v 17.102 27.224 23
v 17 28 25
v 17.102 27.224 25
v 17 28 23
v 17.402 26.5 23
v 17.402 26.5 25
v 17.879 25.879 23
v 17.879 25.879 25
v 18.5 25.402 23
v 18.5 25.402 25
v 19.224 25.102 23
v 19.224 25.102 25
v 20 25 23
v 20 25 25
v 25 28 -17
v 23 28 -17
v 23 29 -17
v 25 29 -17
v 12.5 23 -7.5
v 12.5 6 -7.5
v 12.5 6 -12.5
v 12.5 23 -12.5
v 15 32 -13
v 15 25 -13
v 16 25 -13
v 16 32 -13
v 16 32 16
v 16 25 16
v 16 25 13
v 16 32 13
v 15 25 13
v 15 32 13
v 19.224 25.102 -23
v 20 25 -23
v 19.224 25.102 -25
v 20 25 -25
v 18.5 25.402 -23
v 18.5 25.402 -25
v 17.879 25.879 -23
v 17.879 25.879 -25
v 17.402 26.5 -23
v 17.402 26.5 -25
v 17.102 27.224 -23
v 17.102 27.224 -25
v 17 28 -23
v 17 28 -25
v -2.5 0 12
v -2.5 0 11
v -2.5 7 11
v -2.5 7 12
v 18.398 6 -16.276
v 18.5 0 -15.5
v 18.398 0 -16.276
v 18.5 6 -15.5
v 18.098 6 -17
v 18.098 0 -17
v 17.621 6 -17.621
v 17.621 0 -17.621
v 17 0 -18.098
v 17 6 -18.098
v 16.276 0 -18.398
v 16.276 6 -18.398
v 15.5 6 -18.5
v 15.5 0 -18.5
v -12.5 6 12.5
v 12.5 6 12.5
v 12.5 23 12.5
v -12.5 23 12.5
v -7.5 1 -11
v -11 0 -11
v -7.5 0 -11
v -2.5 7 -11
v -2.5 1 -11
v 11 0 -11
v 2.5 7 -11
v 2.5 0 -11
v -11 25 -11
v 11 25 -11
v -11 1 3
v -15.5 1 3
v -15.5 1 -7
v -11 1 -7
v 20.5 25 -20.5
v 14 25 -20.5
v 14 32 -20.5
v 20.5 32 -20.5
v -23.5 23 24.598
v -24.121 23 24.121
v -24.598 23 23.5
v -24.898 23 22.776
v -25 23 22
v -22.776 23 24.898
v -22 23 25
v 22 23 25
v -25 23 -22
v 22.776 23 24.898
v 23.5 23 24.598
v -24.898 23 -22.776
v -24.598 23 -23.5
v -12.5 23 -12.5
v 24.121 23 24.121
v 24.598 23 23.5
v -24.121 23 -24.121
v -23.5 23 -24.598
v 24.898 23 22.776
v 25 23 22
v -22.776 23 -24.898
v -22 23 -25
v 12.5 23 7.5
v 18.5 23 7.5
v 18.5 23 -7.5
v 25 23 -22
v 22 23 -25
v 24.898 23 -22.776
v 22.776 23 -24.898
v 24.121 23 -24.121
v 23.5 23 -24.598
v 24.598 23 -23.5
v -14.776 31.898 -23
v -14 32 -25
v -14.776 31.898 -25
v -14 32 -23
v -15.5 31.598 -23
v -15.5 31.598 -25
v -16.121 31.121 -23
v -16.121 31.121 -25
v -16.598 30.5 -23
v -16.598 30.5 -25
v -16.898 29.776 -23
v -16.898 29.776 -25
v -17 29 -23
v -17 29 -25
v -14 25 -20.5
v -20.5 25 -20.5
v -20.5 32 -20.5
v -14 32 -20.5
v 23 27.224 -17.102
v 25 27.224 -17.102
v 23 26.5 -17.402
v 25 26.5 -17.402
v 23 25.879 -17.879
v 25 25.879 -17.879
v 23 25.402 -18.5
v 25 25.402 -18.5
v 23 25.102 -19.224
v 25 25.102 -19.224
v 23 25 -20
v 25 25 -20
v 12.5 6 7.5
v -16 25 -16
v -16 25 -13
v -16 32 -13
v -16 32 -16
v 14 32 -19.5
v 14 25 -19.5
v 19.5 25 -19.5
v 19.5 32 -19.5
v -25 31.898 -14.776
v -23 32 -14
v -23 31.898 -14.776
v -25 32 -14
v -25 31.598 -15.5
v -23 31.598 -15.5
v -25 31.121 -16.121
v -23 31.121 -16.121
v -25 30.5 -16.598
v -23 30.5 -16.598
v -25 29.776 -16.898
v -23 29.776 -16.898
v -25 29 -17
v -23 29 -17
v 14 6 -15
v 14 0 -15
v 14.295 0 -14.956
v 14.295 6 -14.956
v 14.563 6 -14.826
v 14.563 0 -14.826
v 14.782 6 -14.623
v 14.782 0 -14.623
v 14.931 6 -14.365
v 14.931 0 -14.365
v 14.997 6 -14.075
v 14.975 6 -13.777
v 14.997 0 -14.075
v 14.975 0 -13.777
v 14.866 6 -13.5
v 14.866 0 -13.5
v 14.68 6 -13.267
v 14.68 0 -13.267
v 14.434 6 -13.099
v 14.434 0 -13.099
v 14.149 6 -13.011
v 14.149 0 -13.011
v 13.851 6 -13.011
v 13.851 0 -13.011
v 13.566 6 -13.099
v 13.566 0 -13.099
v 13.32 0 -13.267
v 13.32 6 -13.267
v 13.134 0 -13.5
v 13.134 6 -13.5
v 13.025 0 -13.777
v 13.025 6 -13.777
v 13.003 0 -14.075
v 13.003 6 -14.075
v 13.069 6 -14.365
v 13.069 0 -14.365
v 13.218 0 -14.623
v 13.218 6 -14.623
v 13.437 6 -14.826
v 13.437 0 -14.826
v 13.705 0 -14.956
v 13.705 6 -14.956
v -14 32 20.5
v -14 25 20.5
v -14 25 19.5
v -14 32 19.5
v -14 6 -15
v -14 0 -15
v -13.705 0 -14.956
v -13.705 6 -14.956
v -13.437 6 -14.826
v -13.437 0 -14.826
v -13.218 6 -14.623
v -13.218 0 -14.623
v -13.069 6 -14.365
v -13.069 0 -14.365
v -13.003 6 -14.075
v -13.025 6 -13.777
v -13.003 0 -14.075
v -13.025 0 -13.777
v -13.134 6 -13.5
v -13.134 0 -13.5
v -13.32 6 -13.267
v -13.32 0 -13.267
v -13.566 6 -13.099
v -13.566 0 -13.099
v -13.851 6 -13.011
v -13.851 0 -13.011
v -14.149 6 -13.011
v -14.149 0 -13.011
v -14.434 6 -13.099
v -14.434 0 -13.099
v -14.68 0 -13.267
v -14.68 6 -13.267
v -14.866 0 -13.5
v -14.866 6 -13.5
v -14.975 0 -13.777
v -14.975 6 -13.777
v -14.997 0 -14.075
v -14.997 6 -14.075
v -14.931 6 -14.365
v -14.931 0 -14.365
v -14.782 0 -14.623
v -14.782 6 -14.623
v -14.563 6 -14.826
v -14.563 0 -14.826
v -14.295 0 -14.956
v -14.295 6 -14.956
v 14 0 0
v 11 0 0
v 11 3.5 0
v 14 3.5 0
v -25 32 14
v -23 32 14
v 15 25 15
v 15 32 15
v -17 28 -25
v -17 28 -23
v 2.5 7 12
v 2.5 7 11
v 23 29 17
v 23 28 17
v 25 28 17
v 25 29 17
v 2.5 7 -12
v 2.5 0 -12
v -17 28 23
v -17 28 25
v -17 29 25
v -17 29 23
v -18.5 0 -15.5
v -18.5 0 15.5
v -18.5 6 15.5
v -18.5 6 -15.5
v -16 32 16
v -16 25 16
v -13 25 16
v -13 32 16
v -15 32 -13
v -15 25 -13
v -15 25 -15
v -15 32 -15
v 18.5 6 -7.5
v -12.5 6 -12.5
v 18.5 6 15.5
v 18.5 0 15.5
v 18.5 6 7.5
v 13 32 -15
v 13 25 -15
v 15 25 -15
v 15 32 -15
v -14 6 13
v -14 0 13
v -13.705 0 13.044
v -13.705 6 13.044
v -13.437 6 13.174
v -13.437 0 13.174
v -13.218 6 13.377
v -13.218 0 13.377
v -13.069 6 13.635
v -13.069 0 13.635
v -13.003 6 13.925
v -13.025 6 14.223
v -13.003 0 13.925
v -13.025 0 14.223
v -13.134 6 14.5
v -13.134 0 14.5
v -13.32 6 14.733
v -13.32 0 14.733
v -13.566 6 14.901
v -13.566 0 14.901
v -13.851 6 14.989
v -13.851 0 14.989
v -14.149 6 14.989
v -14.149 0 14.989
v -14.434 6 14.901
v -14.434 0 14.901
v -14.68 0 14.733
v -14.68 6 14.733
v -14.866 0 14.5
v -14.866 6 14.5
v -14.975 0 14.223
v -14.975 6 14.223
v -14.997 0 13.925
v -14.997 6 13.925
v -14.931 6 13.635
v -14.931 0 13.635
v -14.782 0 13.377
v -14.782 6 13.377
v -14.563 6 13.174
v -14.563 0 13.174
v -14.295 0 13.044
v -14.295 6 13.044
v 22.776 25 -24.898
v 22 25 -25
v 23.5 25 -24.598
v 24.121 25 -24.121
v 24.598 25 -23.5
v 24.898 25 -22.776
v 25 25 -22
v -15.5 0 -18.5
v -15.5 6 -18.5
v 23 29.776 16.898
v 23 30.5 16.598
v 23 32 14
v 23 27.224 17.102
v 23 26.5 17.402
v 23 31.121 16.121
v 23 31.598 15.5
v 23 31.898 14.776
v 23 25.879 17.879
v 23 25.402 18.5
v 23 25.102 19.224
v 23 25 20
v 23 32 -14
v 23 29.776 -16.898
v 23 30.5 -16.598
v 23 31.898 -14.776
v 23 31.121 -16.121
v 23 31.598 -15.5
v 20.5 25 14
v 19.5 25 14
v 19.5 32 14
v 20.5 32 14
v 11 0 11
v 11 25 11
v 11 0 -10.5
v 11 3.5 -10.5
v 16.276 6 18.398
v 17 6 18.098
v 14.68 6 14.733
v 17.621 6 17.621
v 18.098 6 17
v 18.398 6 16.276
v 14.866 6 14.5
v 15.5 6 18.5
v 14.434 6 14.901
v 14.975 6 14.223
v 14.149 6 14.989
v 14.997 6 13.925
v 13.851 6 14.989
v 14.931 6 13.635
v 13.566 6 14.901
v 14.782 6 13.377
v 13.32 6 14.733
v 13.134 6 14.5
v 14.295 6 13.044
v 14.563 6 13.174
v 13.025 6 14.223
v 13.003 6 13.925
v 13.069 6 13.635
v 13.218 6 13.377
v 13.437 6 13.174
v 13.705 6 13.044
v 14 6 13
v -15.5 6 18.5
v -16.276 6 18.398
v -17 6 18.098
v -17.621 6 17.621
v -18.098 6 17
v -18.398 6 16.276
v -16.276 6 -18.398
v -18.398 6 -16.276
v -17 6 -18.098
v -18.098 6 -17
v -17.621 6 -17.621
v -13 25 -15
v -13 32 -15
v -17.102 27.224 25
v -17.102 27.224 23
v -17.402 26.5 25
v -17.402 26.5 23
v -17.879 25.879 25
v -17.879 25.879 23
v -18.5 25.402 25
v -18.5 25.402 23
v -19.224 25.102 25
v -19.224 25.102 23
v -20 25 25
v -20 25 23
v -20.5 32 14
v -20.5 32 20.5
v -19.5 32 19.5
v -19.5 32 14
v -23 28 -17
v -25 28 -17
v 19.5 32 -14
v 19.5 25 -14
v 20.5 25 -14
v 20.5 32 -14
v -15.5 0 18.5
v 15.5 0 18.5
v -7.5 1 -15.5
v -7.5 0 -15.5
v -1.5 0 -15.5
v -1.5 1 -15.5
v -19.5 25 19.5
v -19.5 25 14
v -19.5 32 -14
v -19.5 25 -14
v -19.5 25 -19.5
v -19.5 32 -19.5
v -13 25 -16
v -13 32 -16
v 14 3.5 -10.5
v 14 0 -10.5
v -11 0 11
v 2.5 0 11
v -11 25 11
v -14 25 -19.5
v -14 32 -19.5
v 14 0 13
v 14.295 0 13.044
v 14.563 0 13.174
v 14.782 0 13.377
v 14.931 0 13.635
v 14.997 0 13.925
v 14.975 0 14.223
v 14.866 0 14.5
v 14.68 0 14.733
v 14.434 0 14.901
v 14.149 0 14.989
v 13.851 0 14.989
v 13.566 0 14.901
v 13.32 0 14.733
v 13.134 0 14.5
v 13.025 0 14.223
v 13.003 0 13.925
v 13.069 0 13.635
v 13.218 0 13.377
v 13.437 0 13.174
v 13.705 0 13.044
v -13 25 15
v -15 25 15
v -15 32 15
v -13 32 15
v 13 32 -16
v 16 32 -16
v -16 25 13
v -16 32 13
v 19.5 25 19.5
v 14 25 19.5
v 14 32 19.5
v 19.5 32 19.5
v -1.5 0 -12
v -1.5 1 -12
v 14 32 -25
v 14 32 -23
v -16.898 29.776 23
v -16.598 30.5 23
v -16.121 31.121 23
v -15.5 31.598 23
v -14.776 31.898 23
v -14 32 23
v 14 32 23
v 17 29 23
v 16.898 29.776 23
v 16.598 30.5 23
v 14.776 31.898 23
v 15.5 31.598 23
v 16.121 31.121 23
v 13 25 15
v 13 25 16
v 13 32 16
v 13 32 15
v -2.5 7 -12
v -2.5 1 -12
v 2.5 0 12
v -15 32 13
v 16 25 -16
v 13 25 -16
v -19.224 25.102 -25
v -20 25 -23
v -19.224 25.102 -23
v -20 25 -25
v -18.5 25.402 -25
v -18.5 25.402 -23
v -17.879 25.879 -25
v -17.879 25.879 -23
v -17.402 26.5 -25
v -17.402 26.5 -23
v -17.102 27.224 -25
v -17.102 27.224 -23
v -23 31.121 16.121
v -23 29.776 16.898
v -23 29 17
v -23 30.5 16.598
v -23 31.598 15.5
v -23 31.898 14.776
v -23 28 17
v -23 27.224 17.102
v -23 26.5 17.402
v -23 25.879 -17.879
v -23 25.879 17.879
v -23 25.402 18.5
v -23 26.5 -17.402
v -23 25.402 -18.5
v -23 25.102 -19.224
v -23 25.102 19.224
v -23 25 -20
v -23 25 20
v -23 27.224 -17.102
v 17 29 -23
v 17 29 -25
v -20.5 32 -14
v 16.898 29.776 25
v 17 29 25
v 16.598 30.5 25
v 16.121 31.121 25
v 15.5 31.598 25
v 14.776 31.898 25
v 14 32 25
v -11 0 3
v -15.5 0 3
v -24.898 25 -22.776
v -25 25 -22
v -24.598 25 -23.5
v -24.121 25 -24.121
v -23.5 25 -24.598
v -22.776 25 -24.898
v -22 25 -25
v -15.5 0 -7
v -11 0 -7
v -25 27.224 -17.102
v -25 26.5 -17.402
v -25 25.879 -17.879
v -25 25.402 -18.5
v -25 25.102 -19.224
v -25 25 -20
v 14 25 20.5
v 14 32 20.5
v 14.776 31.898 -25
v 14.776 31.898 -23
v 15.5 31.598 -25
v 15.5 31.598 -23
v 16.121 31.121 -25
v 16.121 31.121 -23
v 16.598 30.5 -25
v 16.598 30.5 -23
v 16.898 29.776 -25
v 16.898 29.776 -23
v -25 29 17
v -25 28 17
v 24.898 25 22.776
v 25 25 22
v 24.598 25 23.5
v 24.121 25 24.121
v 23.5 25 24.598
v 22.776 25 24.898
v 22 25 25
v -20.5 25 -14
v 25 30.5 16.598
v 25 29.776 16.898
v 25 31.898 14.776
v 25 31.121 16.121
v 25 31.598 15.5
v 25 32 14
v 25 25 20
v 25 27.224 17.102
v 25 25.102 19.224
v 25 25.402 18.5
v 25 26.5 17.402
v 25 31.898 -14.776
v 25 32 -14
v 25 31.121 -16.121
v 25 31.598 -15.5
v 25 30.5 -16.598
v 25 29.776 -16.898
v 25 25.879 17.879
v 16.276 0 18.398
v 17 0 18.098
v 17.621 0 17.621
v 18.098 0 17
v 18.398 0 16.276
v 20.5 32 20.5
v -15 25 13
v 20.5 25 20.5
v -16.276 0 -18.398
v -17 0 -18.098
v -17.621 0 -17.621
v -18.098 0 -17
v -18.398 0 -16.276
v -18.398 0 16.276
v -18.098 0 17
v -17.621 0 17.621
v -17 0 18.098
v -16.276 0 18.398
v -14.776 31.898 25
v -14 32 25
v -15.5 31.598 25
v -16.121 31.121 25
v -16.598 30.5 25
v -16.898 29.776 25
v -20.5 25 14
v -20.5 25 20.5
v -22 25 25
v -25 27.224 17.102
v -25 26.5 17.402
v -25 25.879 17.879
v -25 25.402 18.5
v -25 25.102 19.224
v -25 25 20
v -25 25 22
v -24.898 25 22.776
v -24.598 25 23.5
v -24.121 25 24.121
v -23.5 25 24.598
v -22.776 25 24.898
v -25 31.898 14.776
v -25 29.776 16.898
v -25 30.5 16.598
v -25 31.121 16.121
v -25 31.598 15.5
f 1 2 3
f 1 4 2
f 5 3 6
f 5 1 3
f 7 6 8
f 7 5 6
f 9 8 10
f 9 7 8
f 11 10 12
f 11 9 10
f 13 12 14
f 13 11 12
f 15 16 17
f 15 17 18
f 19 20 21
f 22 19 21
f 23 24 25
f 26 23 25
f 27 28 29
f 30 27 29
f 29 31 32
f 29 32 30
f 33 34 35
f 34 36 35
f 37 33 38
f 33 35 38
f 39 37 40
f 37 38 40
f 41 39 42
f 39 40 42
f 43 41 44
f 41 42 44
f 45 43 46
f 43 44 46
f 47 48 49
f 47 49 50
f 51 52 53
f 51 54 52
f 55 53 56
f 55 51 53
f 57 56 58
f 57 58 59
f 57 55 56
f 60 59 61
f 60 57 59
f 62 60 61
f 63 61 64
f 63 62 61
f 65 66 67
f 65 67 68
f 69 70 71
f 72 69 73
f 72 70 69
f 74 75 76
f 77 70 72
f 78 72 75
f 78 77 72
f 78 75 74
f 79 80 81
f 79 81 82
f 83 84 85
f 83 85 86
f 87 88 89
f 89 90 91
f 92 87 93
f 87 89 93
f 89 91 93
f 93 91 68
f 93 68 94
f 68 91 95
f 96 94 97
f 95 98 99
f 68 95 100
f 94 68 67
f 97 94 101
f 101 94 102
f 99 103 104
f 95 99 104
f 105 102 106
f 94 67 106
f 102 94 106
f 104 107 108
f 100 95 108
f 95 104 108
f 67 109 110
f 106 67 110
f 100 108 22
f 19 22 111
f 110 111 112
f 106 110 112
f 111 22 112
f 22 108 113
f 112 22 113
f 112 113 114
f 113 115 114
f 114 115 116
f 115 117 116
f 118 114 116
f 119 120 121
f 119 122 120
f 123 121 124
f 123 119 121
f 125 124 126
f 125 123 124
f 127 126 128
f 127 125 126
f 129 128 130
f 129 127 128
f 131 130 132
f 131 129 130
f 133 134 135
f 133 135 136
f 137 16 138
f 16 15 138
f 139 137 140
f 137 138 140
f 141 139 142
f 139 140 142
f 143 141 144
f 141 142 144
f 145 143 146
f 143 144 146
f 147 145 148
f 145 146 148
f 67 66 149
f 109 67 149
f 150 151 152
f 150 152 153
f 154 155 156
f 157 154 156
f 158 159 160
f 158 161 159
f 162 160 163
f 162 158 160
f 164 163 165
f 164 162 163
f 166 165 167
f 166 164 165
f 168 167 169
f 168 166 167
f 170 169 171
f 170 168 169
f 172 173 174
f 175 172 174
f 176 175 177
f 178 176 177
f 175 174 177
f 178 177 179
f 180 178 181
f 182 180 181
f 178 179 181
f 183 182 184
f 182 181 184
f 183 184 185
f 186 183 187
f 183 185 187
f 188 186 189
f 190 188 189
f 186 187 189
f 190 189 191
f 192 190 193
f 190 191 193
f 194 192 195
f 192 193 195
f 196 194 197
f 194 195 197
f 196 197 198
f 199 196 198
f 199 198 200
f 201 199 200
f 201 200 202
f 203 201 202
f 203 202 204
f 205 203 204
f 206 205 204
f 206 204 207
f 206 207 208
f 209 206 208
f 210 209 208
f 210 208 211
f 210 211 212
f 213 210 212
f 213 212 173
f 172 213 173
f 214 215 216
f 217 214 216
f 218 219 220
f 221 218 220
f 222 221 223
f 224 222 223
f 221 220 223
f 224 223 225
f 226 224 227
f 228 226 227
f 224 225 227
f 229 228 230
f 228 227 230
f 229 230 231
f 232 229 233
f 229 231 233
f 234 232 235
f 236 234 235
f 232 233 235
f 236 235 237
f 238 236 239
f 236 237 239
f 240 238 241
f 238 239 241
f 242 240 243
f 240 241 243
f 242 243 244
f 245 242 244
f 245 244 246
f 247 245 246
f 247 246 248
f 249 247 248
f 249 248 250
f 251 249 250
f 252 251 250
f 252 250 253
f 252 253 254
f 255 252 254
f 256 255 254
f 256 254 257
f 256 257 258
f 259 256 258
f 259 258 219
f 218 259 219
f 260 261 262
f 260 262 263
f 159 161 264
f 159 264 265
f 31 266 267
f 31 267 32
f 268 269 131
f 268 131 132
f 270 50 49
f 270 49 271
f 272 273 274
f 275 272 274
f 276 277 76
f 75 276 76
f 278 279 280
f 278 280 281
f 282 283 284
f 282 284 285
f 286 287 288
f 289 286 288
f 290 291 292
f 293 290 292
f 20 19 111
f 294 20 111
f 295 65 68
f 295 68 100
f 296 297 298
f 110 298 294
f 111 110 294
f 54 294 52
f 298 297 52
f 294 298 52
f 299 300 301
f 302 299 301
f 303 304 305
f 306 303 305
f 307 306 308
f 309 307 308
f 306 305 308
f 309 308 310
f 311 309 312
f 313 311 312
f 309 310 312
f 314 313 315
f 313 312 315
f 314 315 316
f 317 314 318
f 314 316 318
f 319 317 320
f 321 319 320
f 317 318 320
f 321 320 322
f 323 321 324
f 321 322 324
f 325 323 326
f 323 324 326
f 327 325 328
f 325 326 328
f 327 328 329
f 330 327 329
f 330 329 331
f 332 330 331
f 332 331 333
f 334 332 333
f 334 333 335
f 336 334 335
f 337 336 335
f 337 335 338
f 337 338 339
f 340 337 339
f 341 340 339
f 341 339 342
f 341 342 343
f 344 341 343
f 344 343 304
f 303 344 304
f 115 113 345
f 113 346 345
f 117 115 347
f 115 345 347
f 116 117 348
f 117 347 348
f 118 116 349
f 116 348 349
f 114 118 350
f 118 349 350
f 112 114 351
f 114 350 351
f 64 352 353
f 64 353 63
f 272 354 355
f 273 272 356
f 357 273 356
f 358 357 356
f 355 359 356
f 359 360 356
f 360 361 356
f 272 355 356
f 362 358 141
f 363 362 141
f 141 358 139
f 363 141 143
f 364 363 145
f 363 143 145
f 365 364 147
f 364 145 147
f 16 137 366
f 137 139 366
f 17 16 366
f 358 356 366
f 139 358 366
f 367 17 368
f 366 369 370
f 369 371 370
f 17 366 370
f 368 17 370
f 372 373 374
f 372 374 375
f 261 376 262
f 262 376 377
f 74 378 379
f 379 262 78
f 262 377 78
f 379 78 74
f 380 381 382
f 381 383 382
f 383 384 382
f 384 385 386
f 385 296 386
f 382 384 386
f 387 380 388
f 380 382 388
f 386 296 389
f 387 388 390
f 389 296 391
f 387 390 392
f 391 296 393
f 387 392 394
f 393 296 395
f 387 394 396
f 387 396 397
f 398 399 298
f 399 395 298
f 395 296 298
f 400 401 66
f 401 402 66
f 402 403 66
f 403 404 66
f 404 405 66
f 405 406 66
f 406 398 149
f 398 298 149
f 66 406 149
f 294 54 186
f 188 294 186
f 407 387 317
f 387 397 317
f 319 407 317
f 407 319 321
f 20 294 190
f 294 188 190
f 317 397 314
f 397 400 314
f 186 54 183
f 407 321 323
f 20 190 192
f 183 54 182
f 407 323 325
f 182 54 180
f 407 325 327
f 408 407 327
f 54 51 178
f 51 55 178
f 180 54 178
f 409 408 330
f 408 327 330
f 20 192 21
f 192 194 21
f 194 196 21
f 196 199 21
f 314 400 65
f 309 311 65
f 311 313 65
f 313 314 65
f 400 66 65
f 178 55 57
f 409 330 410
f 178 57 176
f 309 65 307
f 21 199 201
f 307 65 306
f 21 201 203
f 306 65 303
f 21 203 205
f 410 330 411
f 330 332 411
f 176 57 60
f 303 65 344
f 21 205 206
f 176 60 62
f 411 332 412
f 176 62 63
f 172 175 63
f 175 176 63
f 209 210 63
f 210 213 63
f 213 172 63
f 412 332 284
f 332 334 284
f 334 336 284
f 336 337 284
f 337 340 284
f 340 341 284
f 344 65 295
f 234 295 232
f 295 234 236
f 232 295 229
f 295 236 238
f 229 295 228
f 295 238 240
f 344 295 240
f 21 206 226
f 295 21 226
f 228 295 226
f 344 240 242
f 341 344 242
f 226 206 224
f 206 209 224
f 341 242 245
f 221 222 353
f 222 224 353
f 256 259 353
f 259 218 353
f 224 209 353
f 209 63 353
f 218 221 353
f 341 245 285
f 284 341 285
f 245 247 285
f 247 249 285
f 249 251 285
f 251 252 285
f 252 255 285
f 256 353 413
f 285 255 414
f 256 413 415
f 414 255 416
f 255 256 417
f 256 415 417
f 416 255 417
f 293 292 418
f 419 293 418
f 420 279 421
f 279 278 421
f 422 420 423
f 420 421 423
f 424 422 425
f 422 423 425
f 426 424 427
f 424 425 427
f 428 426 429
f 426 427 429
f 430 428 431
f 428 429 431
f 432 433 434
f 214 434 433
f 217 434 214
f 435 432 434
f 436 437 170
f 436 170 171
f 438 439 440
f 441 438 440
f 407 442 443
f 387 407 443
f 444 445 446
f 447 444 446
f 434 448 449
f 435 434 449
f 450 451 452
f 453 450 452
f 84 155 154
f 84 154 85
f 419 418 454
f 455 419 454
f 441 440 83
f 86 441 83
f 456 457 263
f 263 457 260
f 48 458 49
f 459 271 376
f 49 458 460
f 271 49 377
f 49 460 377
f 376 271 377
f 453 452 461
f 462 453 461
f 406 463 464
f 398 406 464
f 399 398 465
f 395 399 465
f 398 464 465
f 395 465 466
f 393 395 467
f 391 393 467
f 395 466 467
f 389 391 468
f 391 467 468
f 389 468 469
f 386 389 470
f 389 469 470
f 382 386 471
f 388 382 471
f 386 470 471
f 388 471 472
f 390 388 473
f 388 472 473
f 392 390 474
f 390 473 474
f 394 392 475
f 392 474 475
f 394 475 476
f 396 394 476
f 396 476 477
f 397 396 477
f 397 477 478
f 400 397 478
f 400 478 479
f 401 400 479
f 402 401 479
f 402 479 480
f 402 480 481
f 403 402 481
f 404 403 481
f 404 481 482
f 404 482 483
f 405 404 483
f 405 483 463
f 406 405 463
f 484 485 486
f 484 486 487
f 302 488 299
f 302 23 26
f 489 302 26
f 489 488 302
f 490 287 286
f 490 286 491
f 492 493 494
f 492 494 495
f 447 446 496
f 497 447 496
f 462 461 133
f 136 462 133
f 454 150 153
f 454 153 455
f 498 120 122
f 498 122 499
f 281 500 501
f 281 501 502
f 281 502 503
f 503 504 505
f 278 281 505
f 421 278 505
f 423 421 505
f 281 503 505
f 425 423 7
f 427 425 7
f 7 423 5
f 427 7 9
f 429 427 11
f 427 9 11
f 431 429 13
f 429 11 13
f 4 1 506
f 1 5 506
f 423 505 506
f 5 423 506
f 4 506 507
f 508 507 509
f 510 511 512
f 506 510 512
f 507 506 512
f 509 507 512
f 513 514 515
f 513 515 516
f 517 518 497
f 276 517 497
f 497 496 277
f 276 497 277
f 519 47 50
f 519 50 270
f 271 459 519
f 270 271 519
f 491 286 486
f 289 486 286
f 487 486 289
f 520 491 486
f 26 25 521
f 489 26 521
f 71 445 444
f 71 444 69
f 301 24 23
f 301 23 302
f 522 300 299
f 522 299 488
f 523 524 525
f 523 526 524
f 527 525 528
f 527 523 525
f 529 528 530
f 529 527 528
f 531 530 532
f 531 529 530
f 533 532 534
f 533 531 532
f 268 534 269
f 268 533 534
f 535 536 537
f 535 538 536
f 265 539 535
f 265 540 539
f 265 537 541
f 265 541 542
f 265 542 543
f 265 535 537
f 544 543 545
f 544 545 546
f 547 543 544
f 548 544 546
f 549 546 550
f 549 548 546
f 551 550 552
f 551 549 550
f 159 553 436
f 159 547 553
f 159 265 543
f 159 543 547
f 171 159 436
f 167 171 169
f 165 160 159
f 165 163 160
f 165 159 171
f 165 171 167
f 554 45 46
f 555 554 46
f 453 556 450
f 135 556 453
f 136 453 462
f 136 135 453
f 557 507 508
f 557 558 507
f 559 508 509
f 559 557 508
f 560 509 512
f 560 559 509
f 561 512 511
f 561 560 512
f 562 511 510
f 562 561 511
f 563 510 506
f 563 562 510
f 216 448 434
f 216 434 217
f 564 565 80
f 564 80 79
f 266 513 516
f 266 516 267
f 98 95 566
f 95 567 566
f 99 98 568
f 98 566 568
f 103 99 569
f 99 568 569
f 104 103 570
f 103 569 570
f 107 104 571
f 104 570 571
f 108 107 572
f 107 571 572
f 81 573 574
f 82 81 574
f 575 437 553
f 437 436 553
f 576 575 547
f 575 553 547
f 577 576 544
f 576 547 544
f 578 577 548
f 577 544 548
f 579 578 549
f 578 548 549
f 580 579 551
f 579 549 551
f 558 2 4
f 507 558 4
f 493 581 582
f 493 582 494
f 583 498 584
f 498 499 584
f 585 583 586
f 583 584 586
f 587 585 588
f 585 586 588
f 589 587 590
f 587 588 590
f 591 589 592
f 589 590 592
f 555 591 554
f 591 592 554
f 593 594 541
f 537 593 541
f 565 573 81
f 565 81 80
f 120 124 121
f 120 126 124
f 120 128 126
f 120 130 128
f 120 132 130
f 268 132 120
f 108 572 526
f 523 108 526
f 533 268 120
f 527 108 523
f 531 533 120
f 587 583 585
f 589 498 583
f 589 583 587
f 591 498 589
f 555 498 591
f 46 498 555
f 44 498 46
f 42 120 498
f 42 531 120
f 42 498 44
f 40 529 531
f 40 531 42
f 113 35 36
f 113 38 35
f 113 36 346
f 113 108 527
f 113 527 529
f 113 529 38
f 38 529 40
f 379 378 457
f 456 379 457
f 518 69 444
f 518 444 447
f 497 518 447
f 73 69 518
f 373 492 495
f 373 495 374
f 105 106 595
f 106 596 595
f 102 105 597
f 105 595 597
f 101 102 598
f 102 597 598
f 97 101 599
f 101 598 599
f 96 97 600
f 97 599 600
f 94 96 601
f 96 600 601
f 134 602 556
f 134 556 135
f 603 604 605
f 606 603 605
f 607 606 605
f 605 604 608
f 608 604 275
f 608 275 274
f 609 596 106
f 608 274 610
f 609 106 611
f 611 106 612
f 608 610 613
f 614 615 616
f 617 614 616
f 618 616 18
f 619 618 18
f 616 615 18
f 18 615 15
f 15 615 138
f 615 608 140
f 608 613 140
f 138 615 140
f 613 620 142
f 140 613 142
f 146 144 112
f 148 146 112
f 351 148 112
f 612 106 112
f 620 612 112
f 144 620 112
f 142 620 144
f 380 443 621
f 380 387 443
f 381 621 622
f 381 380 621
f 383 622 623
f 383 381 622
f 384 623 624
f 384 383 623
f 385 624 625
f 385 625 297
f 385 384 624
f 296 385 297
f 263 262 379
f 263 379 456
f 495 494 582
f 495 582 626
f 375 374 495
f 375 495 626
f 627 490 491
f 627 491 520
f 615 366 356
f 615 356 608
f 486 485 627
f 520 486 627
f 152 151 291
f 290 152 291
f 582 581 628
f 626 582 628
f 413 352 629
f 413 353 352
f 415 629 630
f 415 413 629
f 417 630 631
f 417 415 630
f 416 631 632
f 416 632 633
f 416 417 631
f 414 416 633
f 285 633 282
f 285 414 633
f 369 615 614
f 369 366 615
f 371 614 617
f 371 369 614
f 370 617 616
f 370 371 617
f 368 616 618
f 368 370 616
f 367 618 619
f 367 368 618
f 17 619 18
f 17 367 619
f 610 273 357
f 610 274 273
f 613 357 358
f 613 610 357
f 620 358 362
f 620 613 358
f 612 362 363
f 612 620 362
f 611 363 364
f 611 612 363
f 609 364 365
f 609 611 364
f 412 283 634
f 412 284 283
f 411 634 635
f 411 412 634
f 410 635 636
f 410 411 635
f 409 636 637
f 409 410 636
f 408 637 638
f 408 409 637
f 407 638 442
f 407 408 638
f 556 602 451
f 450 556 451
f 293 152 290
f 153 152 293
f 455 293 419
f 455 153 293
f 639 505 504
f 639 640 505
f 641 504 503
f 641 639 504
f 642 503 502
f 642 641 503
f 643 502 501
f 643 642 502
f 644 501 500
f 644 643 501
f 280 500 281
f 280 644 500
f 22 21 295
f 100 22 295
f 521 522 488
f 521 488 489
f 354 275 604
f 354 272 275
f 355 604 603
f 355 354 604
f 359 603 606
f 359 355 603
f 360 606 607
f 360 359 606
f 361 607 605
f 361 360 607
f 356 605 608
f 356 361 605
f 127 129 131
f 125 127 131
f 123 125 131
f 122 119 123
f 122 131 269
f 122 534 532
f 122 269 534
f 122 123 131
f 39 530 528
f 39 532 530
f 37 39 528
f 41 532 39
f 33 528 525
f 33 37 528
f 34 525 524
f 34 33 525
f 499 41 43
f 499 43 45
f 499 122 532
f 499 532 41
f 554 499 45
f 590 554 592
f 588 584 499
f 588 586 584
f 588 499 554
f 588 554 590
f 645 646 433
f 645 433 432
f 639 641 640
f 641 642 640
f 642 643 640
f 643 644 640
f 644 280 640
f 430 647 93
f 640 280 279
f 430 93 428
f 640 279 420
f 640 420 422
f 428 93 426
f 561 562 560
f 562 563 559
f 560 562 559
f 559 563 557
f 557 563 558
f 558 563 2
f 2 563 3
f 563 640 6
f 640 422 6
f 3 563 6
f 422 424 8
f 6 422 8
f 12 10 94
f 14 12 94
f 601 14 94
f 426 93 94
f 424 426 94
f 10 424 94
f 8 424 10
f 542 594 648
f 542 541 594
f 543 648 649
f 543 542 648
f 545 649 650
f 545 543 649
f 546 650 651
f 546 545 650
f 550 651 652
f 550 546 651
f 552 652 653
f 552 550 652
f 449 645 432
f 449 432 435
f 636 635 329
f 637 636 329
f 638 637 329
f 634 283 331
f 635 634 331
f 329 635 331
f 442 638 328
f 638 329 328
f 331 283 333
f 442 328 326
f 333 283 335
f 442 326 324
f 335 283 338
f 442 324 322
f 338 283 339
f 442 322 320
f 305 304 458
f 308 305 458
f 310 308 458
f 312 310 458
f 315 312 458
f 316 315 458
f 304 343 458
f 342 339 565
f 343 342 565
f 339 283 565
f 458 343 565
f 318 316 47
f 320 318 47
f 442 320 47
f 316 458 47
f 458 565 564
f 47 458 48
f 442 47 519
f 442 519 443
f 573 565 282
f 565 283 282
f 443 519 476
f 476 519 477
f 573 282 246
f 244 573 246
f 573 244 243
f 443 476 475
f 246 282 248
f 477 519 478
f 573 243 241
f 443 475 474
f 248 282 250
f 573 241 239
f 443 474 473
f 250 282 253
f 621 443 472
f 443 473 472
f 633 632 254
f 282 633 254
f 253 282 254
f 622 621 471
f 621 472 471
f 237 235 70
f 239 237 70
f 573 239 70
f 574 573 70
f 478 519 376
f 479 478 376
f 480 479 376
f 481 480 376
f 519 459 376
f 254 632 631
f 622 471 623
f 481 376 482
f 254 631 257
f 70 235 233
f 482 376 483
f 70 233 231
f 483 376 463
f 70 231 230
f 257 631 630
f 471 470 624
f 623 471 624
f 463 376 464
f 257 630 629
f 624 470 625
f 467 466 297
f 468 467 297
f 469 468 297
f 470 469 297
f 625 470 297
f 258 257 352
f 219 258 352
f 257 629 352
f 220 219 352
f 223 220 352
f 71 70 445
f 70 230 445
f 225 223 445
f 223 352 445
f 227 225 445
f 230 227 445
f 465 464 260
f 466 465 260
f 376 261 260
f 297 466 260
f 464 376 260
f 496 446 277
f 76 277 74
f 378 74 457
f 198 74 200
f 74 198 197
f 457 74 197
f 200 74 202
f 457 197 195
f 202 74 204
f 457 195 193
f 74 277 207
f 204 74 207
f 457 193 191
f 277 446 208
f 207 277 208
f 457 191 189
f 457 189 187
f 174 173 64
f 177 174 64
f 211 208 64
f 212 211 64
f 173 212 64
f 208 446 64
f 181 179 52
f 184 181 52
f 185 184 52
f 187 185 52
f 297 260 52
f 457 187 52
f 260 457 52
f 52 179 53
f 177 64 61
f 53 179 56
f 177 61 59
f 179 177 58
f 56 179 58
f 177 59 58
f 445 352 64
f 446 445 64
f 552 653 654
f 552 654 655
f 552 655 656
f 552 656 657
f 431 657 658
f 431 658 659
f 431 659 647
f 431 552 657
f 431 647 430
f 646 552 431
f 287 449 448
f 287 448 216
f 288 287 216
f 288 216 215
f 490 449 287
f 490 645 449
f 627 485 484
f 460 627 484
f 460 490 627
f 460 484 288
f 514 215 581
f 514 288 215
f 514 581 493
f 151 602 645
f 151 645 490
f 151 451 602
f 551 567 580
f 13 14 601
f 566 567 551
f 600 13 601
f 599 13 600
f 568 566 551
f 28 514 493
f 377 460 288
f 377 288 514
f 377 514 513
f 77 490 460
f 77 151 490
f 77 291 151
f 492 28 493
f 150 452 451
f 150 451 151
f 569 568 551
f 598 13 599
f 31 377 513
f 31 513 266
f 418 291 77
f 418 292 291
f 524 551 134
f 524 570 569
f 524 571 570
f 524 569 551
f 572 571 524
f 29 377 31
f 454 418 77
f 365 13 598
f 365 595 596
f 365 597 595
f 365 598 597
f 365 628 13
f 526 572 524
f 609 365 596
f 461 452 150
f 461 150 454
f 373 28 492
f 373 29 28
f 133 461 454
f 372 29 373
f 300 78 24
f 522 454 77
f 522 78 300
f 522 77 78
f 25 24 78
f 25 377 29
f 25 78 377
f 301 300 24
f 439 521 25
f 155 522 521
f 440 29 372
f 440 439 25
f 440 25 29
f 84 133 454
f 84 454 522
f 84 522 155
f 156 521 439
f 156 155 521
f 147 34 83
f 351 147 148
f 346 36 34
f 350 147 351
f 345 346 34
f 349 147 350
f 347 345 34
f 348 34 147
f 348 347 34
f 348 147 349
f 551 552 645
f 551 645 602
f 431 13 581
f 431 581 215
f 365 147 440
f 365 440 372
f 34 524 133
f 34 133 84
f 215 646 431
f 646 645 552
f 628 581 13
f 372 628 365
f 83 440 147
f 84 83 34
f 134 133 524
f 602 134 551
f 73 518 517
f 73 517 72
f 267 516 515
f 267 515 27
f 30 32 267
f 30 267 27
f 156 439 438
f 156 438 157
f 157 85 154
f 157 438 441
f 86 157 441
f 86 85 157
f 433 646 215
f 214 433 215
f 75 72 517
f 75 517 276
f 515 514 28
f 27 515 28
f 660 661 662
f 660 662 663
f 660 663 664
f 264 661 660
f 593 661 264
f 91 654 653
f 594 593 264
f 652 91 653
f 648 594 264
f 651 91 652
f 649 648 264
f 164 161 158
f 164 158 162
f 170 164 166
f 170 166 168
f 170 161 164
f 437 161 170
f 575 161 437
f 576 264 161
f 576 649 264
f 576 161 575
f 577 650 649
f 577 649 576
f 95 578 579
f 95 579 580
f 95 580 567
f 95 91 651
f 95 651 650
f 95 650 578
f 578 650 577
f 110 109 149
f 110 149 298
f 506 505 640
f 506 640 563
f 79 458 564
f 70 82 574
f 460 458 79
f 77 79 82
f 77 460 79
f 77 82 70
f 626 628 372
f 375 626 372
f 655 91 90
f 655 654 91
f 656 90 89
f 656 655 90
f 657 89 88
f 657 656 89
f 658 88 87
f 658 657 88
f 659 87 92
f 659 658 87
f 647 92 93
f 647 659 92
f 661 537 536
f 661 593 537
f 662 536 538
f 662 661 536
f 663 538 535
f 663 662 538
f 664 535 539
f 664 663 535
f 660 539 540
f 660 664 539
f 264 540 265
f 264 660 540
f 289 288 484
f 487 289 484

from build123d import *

# Parameters (mm, degrees)
SKETCH_2_W            = 37
SKETCH_2_H            = 37
EXTRUDE_1_DEPTH       = 23
SKETCH_3_W            = 22
SKETCH_3_H            = 22
CUT_EXTRUDE_1_DEPTH   = 23
SKETCH_19_OUTSIDE_W   = 50.432
SKETCH_19_OUTSIDE_H   = 50.432
SKETCH_19_OUTSIDE_W_2 = 25
SKETCH_19_OUTSIDE_H_2 = 25
CUT_EXTRUDE_17_DEPTH  = 17
SKETCH_4_W            = 50
SKETCH_4_H            = 50
EXTRUDE_2_DEPTH       = 9
SKETCH_5_W            = 46
SKETCH_5_H            = 46
CUT_EXTRUDE_3_DEPTH   = 7
SKETCH_12_W           = 8
SKETCH_12_H           = 8
CUT_EXTRUDE_14_DEPTH  = 14
SKETCH_6_W            = 22
SKETCH_6_H            = 22
CUT_EXTRUDE_4_DEPTH   = 2
SKETCH_11_R           = 1
CUT_EXTRUDE_7_DEPTH   = 8
SKETCH_13_W           = 41
SKETCH_13_H           = 41
SKETCH_13_W_2         = 39
SKETCH_13_H_2         = 39
EXTRUDE_3_DEPTH       = 7
SKETCH_17_W           = 32
SKETCH_17_H           = 32
SKETCH_17_W_2         = 30
SKETCH_17_H_2         = 30
EXTRUDE_4_DEPTH       = 7
SKETCH_15_W           = 28
SKETCH_15_H           = 1
SKETCH_15_W_2         = 1
SKETCH_15_H_2         = 28
CUT_EXTRUDE_15_DEPTH  = 7
SKETCH_18_W           = 1
SKETCH_18_H           = 26
SKETCH_18_W_2         = 26
SKETCH_18_H_2         = 1
CUT_EXTRUDE_16_DEPTH  = 7
SKETCH_20_W           = 3
SKETCH_20_H           = 10.5
CUT_EXTRUDE_18_DEPTH  = 3.5
SKETCH_21_W           = 4.5
SKETCH_21_H           = 10
CUT_EXTRUDE_19_DEPTH  = 1
SKETCH_22_W           = 5
SKETCH_22_H           = 1
CUT_EXTRUDE_21_DEPTH  = 7
SKETCH_24_W           = 6
SKETCH_24_H           = 4.5
CUT_EXTRUDE_22_DEPTH  = 1
SKETCH_25_W           = 6
SKETCH_25_H           = 15
EXTRUDE_5_DEPTH       = 17
FILLET_5_R            = 3
FILLET_6_R            = 3
FILLET_10_R           = 3
FILLET_11_R           = 3
FILLET_12_R           = 3
FILLET_14_R           = 3
FILLET_15_R           = 3
FILLET_16_R           = 3
FILLET_19_R           = 3
FILLET_20_R           = 3
FILLET_21_R           = 3
FILLET_22_R           = 3
FILLET_28_R           = 3
FILLET_29_R           = 3
FILLET_30_R           = 3
FILLET_31_R           = 3
FILLET_32_R           = 3
FILLET_33_R           = 3
FILLET_34_R           = 3
FILLET_35_R           = 3
FILLET_36_R           = 3
FILLET_37_R           = 3
FILLET_38_R           = 3
FILLET_39_R           = 3


with BuildPart() as part:
    # 草图2 → 凸台-拉伸1 (new body)
    with BuildSketch(Plane(origin=(0, 0, 0), x_dir=(1, 0, 0), z_dir=(0, 1, 0))):
        Rectangle(SKETCH_2_W, SKETCH_2_H)
    extrude(amount=EXTRUDE_1_DEPTH)

    # 草图3 → 切除-拉伸1 (cut)
    with BuildSketch(Plane.XZ):
        Rectangle(SKETCH_3_W, SKETCH_3_H)
    extrude(amount=-CUT_EXTRUDE_1_DEPTH, mode=Mode.SUBTRACT)

    # 草图19 outside → 切除-拉伸17 (cut)
    with BuildSketch(Plane(origin=(0, 6, 0), x_dir=(-1, 0, 0), z_dir=(0, -1, 0))):
        Rectangle(SKETCH_19_OUTSIDE_W, SKETCH_19_OUTSIDE_H)
        Rectangle(SKETCH_19_OUTSIDE_W_2, SKETCH_19_OUTSIDE_H_2, mode=Mode.SUBTRACT)
    extrude(amount=-CUT_EXTRUDE_17_DEPTH, mode=Mode.SUBTRACT)

    # 草图4 → 凸台-拉伸2 (add)
    with BuildSketch(Plane(origin=(0, 23, 0), x_dir=(1, 0, 0), z_dir=(0, 1, 0))):
        Rectangle(SKETCH_4_W, SKETCH_4_H)
    extrude(amount=EXTRUDE_2_DEPTH)

    # 草图5 → 切除-拉伸3 (cut)
    with BuildSketch(Plane(origin=(0, 32, 0), x_dir=(1, 0, 0), z_dir=(0, 1, 0))):
        Rectangle(SKETCH_5_W, SKETCH_5_H)
    extrude(amount=-CUT_EXTRUDE_3_DEPTH, mode=Mode.SUBTRACT)

    # 草图12 → 切除-拉伸14 (cut)
    with BuildSketch(Plane(origin=(0, 25, 0), x_dir=(1, 0, 0), z_dir=(0, 1, 0))):
        with Locations((-21, -21)):
            Rectangle(SKETCH_12_W, SKETCH_12_H)
        with Locations((-21, 21)):
            Rectangle(SKETCH_12_W, SKETCH_12_H)
        with Locations((21, 21)):
            Rectangle(SKETCH_12_W, SKETCH_12_H)
        with Locations((21, -21)):
            Rectangle(SKETCH_12_W, SKETCH_12_H)
    extrude(amount=CUT_EXTRUDE_14_DEPTH, mode=Mode.SUBTRACT)

    # 草图6 → 切除-拉伸4 (cut)
    with BuildSketch(Plane(origin=(0, 25, 0), x_dir=(1, 0, 0), z_dir=(0, 1, 0))):
        Rectangle(SKETCH_6_W, SKETCH_6_H)
    extrude(amount=-CUT_EXTRUDE_4_DEPTH, mode=Mode.SUBTRACT)

    # 草图11 → 切除-拉伸7 (cut)
    with BuildSketch(Plane.XZ):
        with Locations(Location((14, 14, 0), (0, 0, 270))):
            Circle(SKETCH_11_R)
        with Locations(Location((14, -14, 0), (0, 0, 270))):
            Circle(SKETCH_11_R)
        with Locations(Location((-14, -14, 0), (0, 0, 270))):
            Circle(SKETCH_11_R)
        with Locations(Location((-14, 14, 0), (0, 0, 270))):
            Circle(SKETCH_11_R)
    extrude(amount=-CUT_EXTRUDE_7_DEPTH, mode=Mode.SUBTRACT)

    # 草图13 → 凸台-拉伸3 (add)
    with BuildSketch(Plane(origin=(0, 25, 0), x_dir=(1, 0, 0), z_dir=(0, 1, 0))):
        Rectangle(SKETCH_13_W, SKETCH_13_H)
        Rectangle(SKETCH_13_W_2, SKETCH_13_H_2, mode=Mode.SUBTRACT)
    extrude(amount=EXTRUDE_3_DEPTH)

    # 草图17 → 凸台-拉伸4 (add)
    with BuildSketch(Plane(origin=(0, 25, 0), x_dir=(1, 0, 0), z_dir=(0, 1, 0))):
        Rectangle(SKETCH_17_W, SKETCH_17_H)
        Rectangle(SKETCH_17_W_2, SKETCH_17_H_2, mode=Mode.SUBTRACT)
    extrude(amount=EXTRUDE_4_DEPTH)

    # 草图15 → 切除-拉伸15 (cut)
    with BuildSketch(Plane(origin=(0, 25, 0), x_dir=(1, 0, 0), z_dir=(0, 1, 0))):
        with Locations((0, -20)):
            Rectangle(SKETCH_15_W, SKETCH_15_H)
        with Locations((20, 0)):
            Rectangle(SKETCH_15_W_2, SKETCH_15_H_2)
        with Locations((-20, 0)):
            Rectangle(SKETCH_15_W_2, SKETCH_15_H_2)
        with Locations((0, 20)):
            Rectangle(SKETCH_15_W, SKETCH_15_H)
    extrude(amount=CUT_EXTRUDE_15_DEPTH, mode=Mode.SUBTRACT)

    # 草图18 → 切除-拉伸16 (cut)
    with BuildSketch(Plane(origin=(0, 25, 0), x_dir=(1, 0, 0), z_dir=(0, 1, 0))):
        with Locations((15.5, 0)):
            Rectangle(SKETCH_18_W, SKETCH_18_H)
        with Locations((0, -15.5)):
            Rectangle(SKETCH_18_W_2, SKETCH_18_H_2)
        with Locations((-15.5, 0)):
            Rectangle(SKETCH_18_W, SKETCH_18_H)
        with Locations((0, 15.5)):
            Rectangle(SKETCH_18_W_2, SKETCH_18_H_2)
    extrude(amount=CUT_EXTRUDE_16_DEPTH, mode=Mode.SUBTRACT)

    # 草图20 → 切除-拉伸18 (cut)
    with BuildSketch(Plane.XZ):
        with Locations((12.5, -5.25)):
            Rectangle(SKETCH_20_W, SKETCH_20_H)
    extrude(amount=-CUT_EXTRUDE_18_DEPTH, mode=Mode.SUBTRACT)

    # 草图21 → 切除-拉伸19 (cut)
    with BuildSketch(Plane.XZ):
        with Locations((-13.25, -2)):
            Rectangle(SKETCH_21_W, SKETCH_21_H)
    extrude(amount=-CUT_EXTRUDE_19_DEPTH, mode=Mode.SUBTRACT)

    # 草图22 → 切除-拉伸21 (cut)
    with BuildSketch(Plane.XZ):
        with Locations((0, -11.5)):
            Rectangle(SKETCH_22_W, SKETCH_22_H)
        with Locations((0, 11.5)):
            Rectangle(SKETCH_22_W, SKETCH_22_H)
    extrude(amount=-CUT_EXTRUDE_21_DEPTH, mode=Mode.SUBTRACT)

    # 草图24 → 切除-拉伸22 (cut)
    with BuildSketch(Plane.XZ):
        with Locations((-4.5, -13.25)):
            Rectangle(SKETCH_24_W, SKETCH_24_H)
    extrude(amount=-CUT_EXTRUDE_22_DEPTH, mode=Mode.SUBTRACT)

    # 草图25 → 凸台-拉伸5 (add)
    with BuildSketch(Plane(origin=(0, 6, 0), x_dir=(1, 0, 0), z_dir=(0, 1, 0))):
        with Locations((15.5, 0)):
            Rectangle(SKETCH_25_W, SKETCH_25_H)
    extrude(amount=EXTRUDE_5_DEPTH)

    # 圆角5
    fillet_5_edges = [part.edges().sort_by_distance(p)[0] for p in [
        (25, 24, -25),
    ]]
    fillet(fillet_5_edges, radius=FILLET_5_R)

    # 圆角6
    fillet_6_edges = [part.edges().sort_by_distance(p)[0] for p in [
        (25, 24, 25),
    ]]
    fillet(fillet_6_edges, radius=FILLET_6_R)

    # 圆角10
    fillet_10_edges = [part.edges().sort_by_distance(p)[0] for p in [
        (17, 25, -24),
    ]]
    fillet(fillet_10_edges, radius=FILLET_10_R)

    # 圆角11
    fillet_11_edges = [part.edges().sort_by_distance(p)[0] for p in [
        (24, 32, -17),
    ]]
    fillet(fillet_11_edges, radius=FILLET_11_R)

    # 圆角12
    fillet_12_edges = [part.edges().sort_by_distance(p)[0] for p in [
        (24, 25, -17),
    ]]
    fillet(fillet_12_edges, radius=FILLET_12_R)

    # 圆角14
    fillet_14_edges = [part.edges().sort_by_distance(p)[0] for p in [
        (17, 25, 24),
    ]]
    fillet(fillet_14_edges, radius=FILLET_14_R)

    # 圆角15
    fillet_15_edges = [part.edges().sort_by_distance(p)[0] for p in [
        (24, 32, 17),
    ]]
    fillet(fillet_15_edges, radius=FILLET_15_R)

    # 圆角16
    fillet_16_edges = [part.edges().sort_by_distance(p)[0] for p in [
        (24, 25, 17),
    ]]
    fillet(fillet_16_edges, radius=FILLET_16_R)

    # 圆角19
    fillet_19_edges = [part.edges().sort_by_distance(p)[0] for p in [
        (-18.5, 3, -18.5),
    ]]
    fillet(fillet_19_edges, radius=FILLET_19_R)

    # 圆角20
    fillet_20_edges = [part.edges().sort_by_distance(p)[0] for p in [
        (-18.5, 3, 18.5),
    ]]
    fillet(fillet_20_edges, radius=FILLET_20_R)

    # 圆角21
    fillet_21_edges = [part.edges().sort_by_distance(p)[0] for p in [
        (18.5, 3, 18.5),
    ]]
    fillet(fillet_21_edges, radius=FILLET_21_R)

    # 圆角22
    fillet_22_edges = [part.edges().sort_by_distance(p)[0] for p in [
        (18.5, 3, -18.5),
    ]]
    fillet(fillet_22_edges, radius=FILLET_22_R)

    # 圆角28
    fillet_28_edges = [part.edges().sort_by_distance(p)[0] for p in [
        (-17, 25, -24),
    ]]
    fillet(fillet_28_edges, radius=FILLET_28_R)

    # 圆角29
    fillet_29_edges = [part.edges().sort_by_distance(p)[0] for p in [
        (-24, 25, -17),
    ]]
    fillet(fillet_29_edges, radius=FILLET_29_R)

    # 圆角30
    fillet_30_edges = [part.edges().sort_by_distance(p)[0] for p in [
        (-24, 25, 17),
    ]]
    fillet(fillet_30_edges, radius=FILLET_30_R)

    # 圆角31
    fillet_31_edges = [part.edges().sort_by_distance(p)[0] for p in [
        (-17, 25, 24),
    ]]
    fillet(fillet_31_edges, radius=FILLET_31_R)

    # 圆角32
    fillet_32_edges = [part.edges().sort_by_distance(p)[0] for p in [
        (17, 32, 24),
    ]]
    fillet(fillet_32_edges, radius=FILLET_32_R)

    # 圆角33
    fillet_33_edges = [part.edges().sort_by_distance(p)[0] for p in [
        (-17, 32, 24),
    ]]
    fillet(fillet_33_edges, radius=FILLET_33_R)

    # 圆角34
    fillet_34_edges = [part.edges().sort_by_distance(p)[0] for p in [
        (17, 32, -24),
    ]]
    fillet(fillet_34_edges, radius=FILLET_34_R)

    # 圆角35
    fillet_35_edges = [part.edges().sort_by_distance(p)[0] for p in [
        (-17, 32, -24),
    ]]
    fillet(fillet_35_edges, radius=FILLET_35_R)

    # 圆角36
    fillet_36_edges = [part.edges().sort_by_distance(p)[0] for p in [
        (-24, 32, 17),
    ]]
    fillet(fillet_36_edges, radius=FILLET_36_R)

    # 圆角37
    fillet_37_edges = [part.edges().sort_by_distance(p)[0] for p in [
        (-24, 32, -17),
    ]]
    fillet(fillet_37_edges, radius=FILLET_37_R)

    # 圆角38
    fillet_38_edges = [part.edges().sort_by_distance(p)[0] for p in [
        (-25, 24, 25),
    ]]
    fillet(fillet_38_edges, radius=FILLET_38_R)

    # 圆角39
    fillet_39_edges = [part.edges().sort_by_distance(p)[0] for p in [
        (-25, 24, -25),
    ]]
    fillet(fillet_39_edges, radius=FILLET_39_R)


solid = part.part
